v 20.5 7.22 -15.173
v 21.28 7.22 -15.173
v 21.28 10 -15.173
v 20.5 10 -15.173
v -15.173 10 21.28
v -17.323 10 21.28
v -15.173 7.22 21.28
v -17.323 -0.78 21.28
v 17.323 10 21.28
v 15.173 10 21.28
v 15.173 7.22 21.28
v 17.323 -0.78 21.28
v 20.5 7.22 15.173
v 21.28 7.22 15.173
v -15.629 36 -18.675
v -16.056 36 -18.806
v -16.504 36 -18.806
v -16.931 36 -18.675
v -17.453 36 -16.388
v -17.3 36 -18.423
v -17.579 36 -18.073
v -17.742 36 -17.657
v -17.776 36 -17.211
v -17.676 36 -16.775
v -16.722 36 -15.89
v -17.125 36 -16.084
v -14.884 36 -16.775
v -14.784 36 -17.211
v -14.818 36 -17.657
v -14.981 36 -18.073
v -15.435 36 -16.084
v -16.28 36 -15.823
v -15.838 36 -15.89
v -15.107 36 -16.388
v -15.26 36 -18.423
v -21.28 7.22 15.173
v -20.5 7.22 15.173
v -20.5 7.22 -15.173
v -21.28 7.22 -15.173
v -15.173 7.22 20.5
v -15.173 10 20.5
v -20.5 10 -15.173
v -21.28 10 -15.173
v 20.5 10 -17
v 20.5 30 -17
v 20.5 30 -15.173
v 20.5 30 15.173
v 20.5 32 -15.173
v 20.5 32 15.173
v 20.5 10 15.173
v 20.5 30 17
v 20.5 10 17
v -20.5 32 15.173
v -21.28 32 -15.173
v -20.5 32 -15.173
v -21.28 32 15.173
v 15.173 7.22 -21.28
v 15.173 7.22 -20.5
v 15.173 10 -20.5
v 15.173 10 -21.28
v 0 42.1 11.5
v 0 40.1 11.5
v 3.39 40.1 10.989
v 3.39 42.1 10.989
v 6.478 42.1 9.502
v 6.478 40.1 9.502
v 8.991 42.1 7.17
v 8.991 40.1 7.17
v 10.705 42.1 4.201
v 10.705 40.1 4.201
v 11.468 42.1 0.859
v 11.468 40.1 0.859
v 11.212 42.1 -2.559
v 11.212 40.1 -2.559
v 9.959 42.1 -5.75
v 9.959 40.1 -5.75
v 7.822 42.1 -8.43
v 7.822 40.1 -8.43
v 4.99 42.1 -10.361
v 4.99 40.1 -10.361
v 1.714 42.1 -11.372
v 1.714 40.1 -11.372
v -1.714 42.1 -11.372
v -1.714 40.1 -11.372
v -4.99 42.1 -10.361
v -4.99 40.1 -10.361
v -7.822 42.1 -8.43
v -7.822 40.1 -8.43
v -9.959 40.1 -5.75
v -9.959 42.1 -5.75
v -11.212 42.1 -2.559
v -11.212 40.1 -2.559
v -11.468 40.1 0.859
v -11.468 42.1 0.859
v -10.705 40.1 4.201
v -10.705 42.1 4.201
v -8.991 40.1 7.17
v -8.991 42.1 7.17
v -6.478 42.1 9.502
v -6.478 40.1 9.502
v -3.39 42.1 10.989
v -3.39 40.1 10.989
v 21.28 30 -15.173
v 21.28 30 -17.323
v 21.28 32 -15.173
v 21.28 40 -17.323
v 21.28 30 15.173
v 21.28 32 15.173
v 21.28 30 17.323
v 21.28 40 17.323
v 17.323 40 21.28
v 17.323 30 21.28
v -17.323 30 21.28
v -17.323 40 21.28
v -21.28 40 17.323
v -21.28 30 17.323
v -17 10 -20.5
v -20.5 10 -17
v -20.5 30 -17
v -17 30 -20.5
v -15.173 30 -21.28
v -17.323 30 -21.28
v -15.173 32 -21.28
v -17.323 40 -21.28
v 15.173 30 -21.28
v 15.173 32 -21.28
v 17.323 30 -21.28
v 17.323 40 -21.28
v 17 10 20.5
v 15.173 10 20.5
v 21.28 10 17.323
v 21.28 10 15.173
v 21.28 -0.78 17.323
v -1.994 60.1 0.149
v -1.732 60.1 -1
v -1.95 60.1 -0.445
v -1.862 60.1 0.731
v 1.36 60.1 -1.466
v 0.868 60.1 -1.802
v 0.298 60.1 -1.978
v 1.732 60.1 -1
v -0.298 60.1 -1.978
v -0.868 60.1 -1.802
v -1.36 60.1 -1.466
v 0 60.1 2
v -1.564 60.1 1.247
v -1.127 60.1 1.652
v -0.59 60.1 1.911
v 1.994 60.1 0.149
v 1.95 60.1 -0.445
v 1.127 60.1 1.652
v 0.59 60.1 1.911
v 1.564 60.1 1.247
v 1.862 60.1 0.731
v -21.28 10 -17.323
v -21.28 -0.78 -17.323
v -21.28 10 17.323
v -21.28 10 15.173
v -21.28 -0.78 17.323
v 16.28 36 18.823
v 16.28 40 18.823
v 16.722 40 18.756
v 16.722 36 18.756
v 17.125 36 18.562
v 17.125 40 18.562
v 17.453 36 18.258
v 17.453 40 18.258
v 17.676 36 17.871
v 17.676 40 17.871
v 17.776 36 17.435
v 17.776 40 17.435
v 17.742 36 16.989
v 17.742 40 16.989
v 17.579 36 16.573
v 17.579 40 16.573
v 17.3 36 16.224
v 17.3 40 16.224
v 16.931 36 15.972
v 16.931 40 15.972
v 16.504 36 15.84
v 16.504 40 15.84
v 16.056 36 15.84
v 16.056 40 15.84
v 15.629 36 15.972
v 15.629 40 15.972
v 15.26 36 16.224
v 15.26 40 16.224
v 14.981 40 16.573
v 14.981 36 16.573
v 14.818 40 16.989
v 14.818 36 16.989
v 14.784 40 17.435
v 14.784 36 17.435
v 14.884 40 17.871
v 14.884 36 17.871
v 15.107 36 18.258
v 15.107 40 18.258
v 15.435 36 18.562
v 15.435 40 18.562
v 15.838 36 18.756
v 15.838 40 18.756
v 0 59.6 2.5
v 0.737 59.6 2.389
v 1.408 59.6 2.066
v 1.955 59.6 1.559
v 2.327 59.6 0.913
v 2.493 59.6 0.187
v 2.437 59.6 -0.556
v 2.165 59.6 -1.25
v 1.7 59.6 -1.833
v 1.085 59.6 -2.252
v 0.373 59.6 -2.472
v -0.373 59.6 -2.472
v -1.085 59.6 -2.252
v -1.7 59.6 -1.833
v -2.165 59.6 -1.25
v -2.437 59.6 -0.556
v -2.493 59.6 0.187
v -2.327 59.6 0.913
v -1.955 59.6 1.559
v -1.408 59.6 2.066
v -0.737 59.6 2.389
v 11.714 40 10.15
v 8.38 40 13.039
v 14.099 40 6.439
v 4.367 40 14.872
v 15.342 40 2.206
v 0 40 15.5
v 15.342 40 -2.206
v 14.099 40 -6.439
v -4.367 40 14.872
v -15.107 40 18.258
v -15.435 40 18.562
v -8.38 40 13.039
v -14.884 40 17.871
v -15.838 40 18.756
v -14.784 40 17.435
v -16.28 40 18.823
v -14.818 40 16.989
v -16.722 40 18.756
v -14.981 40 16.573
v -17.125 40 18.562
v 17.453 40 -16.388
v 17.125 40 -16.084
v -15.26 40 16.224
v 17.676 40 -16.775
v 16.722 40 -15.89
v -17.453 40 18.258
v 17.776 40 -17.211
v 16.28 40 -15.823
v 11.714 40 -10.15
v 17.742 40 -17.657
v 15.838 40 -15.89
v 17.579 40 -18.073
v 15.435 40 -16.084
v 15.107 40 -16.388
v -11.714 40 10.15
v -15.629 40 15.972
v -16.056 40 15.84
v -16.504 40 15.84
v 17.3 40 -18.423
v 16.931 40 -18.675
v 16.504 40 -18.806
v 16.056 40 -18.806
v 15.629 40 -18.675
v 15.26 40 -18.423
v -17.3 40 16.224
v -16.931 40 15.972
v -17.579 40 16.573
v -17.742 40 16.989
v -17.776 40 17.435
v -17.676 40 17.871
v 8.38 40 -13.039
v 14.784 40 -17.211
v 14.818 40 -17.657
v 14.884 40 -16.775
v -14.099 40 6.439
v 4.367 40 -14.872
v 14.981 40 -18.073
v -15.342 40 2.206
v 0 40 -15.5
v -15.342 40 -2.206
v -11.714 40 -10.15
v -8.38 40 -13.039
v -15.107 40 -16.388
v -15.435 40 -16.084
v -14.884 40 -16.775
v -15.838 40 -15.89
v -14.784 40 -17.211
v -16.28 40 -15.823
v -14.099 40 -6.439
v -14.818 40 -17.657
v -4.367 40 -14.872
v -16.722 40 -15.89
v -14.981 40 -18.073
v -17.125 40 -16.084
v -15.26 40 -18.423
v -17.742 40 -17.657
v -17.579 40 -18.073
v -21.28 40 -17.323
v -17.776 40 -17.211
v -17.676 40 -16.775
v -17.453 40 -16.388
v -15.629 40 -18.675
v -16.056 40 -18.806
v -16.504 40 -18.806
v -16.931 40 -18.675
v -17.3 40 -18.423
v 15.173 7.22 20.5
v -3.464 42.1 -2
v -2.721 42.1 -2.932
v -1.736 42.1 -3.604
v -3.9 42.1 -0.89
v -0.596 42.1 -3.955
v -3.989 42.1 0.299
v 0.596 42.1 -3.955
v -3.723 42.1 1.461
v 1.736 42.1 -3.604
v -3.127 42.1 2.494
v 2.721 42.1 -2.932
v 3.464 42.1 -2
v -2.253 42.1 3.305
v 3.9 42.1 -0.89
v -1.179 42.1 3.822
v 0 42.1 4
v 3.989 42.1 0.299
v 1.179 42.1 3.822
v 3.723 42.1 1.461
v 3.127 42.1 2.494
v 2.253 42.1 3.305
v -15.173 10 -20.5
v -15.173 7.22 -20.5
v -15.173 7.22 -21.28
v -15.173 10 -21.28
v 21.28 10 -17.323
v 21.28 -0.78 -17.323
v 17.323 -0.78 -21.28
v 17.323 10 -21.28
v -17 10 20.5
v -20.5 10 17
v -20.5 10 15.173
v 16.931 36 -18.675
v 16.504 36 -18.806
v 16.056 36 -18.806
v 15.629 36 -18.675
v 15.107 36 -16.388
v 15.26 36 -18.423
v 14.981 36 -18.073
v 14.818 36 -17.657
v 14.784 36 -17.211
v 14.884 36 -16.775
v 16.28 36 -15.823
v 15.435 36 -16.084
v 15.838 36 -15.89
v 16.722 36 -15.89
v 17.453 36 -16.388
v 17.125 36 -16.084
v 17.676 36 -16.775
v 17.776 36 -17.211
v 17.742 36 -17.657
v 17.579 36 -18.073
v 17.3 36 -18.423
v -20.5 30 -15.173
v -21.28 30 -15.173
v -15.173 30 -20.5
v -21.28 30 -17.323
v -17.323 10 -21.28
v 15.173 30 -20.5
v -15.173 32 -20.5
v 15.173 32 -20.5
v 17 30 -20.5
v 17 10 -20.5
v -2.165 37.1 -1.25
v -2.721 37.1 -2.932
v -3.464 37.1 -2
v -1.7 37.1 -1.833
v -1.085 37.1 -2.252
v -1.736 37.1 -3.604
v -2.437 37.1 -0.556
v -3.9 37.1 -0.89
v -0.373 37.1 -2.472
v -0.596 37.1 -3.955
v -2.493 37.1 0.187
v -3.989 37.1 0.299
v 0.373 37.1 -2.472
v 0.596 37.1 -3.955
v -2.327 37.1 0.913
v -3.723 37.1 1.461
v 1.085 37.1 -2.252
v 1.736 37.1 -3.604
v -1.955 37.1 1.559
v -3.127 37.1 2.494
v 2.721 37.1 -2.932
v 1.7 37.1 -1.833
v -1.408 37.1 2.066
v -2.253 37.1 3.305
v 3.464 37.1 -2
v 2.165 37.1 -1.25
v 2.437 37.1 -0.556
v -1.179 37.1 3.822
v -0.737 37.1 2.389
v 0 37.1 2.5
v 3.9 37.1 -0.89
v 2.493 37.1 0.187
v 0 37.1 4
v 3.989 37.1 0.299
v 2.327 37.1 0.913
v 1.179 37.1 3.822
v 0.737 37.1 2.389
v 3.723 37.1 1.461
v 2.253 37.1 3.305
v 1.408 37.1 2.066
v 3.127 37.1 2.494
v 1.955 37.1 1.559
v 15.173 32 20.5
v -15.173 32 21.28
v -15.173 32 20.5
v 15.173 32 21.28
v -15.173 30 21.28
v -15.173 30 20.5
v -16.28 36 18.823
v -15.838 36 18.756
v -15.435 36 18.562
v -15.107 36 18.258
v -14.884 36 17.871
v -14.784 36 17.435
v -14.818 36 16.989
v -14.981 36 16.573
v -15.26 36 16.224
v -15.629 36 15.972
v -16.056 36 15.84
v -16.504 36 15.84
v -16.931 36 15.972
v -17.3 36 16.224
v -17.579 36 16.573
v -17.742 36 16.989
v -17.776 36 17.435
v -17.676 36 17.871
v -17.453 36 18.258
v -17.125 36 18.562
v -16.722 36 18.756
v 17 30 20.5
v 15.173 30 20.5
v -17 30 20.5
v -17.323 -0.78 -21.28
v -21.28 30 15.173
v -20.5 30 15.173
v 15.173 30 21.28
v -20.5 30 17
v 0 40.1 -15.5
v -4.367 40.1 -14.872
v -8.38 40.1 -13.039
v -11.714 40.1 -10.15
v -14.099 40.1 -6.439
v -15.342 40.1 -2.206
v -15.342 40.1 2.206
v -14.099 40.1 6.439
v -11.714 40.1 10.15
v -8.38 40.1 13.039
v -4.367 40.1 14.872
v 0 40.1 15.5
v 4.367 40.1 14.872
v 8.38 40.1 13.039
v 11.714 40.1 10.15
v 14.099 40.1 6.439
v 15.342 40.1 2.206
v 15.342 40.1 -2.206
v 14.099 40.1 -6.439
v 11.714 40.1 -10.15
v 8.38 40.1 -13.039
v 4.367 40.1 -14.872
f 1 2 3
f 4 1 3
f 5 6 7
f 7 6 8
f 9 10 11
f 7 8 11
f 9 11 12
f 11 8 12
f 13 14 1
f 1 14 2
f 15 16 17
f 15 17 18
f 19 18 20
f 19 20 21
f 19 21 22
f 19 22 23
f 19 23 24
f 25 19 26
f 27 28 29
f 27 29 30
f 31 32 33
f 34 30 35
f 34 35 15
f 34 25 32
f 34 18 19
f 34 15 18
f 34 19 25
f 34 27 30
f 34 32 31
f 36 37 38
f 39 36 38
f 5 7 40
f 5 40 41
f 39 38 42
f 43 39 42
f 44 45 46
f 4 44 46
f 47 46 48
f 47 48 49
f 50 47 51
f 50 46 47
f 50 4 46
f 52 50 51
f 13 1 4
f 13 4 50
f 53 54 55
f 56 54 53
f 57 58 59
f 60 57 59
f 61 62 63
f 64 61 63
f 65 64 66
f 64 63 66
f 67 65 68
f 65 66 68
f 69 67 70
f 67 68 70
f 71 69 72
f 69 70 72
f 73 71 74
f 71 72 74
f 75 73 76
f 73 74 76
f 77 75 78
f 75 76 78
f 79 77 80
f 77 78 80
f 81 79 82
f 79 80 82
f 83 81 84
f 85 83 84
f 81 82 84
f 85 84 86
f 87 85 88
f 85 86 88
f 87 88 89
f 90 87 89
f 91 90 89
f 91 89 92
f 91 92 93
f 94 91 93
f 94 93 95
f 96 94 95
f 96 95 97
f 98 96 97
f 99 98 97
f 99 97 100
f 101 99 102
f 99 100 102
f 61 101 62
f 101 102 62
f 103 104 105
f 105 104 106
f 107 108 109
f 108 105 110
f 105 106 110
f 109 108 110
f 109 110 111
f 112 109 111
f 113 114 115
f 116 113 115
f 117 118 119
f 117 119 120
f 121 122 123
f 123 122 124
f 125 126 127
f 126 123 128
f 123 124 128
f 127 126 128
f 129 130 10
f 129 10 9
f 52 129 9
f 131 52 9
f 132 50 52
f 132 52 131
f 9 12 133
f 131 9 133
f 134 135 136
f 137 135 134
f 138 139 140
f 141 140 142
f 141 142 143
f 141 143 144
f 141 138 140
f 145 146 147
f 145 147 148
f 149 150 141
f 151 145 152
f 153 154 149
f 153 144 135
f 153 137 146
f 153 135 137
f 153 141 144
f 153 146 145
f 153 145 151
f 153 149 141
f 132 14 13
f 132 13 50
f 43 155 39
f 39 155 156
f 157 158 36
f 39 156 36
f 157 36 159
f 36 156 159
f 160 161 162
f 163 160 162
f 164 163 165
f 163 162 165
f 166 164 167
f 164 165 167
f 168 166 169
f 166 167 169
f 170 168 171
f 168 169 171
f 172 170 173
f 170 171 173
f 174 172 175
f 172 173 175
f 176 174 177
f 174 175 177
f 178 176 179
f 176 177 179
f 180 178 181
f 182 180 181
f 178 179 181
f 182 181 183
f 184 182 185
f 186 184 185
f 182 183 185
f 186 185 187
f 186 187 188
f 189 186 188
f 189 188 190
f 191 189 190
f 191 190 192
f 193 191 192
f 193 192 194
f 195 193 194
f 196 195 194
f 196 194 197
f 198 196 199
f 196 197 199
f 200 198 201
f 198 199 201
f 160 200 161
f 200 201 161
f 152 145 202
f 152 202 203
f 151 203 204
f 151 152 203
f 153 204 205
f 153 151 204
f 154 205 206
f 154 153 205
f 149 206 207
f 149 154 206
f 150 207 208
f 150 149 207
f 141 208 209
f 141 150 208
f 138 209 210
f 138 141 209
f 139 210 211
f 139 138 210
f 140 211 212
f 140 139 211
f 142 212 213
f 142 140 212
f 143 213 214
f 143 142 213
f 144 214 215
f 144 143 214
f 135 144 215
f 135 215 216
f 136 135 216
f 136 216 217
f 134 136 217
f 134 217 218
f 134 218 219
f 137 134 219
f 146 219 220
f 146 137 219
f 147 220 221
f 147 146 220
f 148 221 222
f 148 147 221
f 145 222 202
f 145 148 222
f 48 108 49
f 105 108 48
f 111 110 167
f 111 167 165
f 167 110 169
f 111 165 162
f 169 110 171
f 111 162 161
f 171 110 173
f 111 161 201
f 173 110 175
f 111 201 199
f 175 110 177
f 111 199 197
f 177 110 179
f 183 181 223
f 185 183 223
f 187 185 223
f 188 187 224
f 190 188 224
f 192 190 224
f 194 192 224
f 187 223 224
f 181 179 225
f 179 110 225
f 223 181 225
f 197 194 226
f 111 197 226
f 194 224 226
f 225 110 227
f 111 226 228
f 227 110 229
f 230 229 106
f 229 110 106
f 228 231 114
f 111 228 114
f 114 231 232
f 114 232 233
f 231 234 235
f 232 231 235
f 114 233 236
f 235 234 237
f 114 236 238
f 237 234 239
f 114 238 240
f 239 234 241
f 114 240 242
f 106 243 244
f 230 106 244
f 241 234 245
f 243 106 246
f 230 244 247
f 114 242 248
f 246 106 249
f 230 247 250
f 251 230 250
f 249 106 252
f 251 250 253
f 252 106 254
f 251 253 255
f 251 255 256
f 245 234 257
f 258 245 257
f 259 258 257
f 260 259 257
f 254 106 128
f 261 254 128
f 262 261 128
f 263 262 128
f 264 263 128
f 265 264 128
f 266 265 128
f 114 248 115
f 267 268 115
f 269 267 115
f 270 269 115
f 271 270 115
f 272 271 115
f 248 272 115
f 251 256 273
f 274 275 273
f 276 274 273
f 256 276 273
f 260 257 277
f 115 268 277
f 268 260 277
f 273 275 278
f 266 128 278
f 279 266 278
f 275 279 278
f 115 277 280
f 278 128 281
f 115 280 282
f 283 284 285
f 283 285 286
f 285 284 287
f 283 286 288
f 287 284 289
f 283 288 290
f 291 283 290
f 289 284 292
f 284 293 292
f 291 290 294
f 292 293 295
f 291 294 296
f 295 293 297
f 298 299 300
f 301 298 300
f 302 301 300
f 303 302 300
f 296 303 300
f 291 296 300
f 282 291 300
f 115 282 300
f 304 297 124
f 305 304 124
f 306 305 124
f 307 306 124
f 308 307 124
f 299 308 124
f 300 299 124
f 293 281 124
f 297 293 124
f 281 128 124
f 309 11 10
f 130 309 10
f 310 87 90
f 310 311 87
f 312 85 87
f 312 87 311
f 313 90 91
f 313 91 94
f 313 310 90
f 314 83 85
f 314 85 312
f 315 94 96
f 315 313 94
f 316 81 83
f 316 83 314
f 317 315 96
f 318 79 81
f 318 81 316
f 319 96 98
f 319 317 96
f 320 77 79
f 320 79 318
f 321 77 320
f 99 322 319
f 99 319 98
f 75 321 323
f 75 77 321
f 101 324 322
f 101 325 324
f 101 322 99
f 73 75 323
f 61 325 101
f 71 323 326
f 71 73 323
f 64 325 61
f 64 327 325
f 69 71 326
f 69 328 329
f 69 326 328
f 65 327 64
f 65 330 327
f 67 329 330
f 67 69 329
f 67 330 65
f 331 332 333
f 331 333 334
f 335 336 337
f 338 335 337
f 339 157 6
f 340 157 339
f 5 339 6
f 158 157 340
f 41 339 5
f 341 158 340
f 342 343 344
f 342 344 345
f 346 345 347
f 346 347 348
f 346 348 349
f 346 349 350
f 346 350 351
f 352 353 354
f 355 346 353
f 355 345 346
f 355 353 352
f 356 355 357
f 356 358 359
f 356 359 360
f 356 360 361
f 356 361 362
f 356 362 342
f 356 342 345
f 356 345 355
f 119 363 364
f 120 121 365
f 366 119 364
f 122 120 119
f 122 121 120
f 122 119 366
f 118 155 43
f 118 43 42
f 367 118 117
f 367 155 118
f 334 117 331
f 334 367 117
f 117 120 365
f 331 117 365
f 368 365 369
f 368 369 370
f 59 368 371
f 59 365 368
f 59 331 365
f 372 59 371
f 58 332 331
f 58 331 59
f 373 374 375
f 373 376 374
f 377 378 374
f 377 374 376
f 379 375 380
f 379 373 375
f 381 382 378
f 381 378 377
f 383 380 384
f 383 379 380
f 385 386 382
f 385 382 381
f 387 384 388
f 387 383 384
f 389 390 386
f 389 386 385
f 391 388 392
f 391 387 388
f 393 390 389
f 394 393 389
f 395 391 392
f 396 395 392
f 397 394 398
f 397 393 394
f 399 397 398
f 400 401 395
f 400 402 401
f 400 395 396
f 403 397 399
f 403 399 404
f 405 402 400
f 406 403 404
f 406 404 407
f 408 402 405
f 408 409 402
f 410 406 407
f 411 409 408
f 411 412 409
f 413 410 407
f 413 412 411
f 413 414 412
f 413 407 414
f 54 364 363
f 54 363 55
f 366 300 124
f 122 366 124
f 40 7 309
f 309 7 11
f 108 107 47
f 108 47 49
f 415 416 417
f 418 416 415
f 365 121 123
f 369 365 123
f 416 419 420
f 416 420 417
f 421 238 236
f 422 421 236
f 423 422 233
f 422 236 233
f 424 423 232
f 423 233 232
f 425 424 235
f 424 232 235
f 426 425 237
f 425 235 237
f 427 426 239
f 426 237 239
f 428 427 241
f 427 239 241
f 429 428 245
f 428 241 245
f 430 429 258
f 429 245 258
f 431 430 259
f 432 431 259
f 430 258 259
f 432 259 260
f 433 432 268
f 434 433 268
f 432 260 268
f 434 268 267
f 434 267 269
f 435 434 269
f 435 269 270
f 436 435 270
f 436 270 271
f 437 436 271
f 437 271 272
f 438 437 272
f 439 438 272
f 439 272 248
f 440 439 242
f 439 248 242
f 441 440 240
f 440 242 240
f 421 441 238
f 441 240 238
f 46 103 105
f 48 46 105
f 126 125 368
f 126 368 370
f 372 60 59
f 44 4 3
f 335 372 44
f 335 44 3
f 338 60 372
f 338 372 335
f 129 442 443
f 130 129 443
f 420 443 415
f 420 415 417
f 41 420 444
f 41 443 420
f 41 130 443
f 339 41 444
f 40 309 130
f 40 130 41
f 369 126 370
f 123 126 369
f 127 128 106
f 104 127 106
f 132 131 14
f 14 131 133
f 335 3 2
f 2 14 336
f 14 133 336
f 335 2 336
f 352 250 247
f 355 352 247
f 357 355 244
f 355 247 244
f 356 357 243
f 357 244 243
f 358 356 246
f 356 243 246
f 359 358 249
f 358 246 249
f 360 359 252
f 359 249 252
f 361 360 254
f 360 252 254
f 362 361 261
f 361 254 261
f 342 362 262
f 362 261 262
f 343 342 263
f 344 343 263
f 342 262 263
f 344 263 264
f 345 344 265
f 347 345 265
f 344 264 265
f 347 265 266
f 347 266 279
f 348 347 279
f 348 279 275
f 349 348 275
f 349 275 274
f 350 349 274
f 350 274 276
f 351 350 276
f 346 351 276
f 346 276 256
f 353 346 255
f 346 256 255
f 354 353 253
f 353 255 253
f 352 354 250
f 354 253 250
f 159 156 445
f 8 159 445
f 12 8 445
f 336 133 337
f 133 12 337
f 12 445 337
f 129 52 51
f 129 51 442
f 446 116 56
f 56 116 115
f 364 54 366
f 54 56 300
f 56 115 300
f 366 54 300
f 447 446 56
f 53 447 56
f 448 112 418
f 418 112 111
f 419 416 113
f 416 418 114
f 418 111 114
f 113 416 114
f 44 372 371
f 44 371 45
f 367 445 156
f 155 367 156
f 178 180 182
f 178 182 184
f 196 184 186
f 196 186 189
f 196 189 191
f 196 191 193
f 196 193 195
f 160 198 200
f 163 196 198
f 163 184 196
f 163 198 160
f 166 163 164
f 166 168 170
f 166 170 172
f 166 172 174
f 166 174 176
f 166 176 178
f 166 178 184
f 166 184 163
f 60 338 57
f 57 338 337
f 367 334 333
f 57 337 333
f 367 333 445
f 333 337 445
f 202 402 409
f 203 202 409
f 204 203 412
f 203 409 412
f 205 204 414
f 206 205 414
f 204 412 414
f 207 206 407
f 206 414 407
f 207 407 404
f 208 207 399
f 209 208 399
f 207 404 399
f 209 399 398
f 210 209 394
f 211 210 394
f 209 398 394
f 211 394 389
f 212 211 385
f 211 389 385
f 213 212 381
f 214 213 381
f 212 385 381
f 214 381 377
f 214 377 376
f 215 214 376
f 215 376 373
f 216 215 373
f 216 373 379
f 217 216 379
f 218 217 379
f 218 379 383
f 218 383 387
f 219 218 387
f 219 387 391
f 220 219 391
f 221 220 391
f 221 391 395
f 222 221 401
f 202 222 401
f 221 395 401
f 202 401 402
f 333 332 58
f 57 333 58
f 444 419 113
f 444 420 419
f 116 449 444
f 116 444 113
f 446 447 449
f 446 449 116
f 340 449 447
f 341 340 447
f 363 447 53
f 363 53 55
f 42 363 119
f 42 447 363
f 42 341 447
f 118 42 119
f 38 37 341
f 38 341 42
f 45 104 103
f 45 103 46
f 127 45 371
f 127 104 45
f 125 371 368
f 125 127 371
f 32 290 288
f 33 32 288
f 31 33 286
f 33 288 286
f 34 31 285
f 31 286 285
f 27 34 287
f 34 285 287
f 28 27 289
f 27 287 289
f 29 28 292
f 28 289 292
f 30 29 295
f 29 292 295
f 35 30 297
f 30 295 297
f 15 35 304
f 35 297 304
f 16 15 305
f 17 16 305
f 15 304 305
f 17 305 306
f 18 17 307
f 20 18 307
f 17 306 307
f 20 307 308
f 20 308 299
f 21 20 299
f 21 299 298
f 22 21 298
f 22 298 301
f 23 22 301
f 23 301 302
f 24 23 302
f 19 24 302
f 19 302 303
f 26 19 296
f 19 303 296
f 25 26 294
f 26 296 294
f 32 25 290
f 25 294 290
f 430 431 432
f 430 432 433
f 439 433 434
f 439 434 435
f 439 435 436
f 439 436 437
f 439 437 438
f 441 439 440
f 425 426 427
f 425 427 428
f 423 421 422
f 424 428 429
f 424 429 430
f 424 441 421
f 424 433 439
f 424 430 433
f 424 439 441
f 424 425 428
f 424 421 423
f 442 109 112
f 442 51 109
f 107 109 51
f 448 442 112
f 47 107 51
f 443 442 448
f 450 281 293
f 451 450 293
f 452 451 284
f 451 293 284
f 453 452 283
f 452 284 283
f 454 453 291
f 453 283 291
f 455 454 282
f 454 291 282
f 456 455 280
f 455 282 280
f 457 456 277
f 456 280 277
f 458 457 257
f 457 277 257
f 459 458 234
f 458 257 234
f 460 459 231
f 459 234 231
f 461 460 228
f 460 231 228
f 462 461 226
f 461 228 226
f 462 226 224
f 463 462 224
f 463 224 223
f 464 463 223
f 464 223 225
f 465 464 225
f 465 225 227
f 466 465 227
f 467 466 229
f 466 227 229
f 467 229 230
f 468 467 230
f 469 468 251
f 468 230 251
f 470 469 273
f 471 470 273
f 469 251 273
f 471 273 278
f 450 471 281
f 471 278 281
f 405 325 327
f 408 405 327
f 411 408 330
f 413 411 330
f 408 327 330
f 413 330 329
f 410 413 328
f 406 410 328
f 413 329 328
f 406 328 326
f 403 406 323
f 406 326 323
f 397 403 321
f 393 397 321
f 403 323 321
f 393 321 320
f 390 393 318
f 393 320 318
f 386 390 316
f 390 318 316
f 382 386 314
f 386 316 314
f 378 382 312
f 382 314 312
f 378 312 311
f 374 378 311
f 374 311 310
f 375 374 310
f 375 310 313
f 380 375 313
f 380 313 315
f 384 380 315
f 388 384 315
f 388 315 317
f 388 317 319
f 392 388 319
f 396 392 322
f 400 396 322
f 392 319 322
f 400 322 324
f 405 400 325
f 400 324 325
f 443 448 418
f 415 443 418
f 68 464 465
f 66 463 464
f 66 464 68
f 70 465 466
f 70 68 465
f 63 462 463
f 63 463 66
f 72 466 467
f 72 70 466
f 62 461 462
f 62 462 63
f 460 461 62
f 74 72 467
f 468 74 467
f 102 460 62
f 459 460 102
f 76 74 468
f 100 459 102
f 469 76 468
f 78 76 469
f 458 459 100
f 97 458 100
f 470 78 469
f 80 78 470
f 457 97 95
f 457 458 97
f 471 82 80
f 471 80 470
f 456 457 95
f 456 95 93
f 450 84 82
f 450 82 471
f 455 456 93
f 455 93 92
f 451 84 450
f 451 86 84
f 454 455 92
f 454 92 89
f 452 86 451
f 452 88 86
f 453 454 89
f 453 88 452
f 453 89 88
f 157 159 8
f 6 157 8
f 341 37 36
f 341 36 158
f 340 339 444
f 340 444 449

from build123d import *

# Parameters (mm, degrees)
SALIENTE_EXTRUIR2_DEPTH = 10
VACIADO6_T              = 0.78
CROQUIS2_W              = 30.346173158
CROQUIS2_H              = 2.78
CORTAR_EXTRUIR1_DEPTH   = 49.622957541
CROQUIS3_W              = 30.346173158
CROQUIS3_H              = 2.78
CORTAR_EXTRUIR2_DEPTH   = 49.622957541
SALIENTE_EXTRUIR3_DEPTH = 40
SALIENTE_EXTRUIR4_DEPTH = 10
CROQUIS6_W              = 30.346173158
CROQUIS6_H              = 2
CORTAR_EXTRUIR3_DEPTH   = 0.78
CROQUIS7_W              = 30.346173158
CROQUIS7_H              = 2
CORTAR_EXTRUIR4_DEPTH   = 0.78
CROQUIS8_W              = 30.346173158
CROQUIS8_H              = 2
CORTAR_EXTRUIR5_DEPTH   = 0.78
CROQUIS9_W              = 30.346173158
CROQUIS9_H              = 2
CORTAR_EXTRUIR6_DEPTH   = 0.78
CROQUIS10_R             = 1.5
CORTAR_EXTRUIR7_DEPTH   = 4
CROQUIS11_R             = 15.5
SALIENTE_EXTRUIR5_DEPTH = 0.1
CROQUIS12_R             = 11.5
SALIENTE_EXTRUIR6_DEPTH = 2
CROQUIS13_R             = 4
CORTAR_EXTRUIR8_DEPTH   = 5
CROQUIS14_R             = 2.5
SALIENTE_EXTRUIR7_DEPTH = 23
CHAFL_N1_SIZE           = 0.5


with BuildPart() as part:
    # Croquis1 → Saliente-Extruir2 (new body)
    with BuildSketch(Plane(origin=(0, 0, 0), x_dir=(1, 0, 0), z_dir=(0, 1, 0))):
        Polygon((20.5, 17), (17, 20.5), (-17, 20.5), (-20.5, 17), (-20.5, -17), (-17, -20.5), (17, -20.5), (20.5, -17), align=None)
    extrude(amount=SALIENTE_EXTRUIR2_DEPTH)

    # Vaciado6
    vaciado6_openings = [part.faces().sort_by_distance(p)[0] for p in [
        (0, 10, 0),
    ]]
    offset(amount=VACIADO6_T, openings=vaciado6_openings, kind=Kind.INTERSECTION)

    # Croquis2 → Cortar-Extruir1 (cut, through all)
    with BuildSketch(Plane(origin=(21.28, 0, 0), x_dir=(0, 0, -1), z_dir=(1, 0, 0))):
        with Locations((0, 8.61)):
            Rectangle(CROQUIS2_W, CROQUIS2_H)
    extrude(amount=-CORTAR_EXTRUIR1_DEPTH, mode=Mode.SUBTRACT)

    # Croquis3 → Cortar-Extruir2 (cut, through all)
    with BuildSketch(Plane.XY.offset(21.28)):
        with Locations((0, 8.61)):
            Rectangle(CROQUIS3_W, CROQUIS3_H)
    extrude(amount=-CORTAR_EXTRUIR2_DEPTH, mode=Mode.SUBTRACT)

    # Croquis4 → Saliente-Extruir3 (add)
    with BuildSketch(Plane(origin=(0, 0, 0), x_dir=(1, 0, 0), z_dir=(0, 1, 0))):
        Polygon((-17, 20.5), (17, 20.5), (20.5, 17), (20.5, -17), (17, -20.5), (-17, -20.5), (-20.5, -17), (-20.5, 17), align=None)
    extrude(amount=SALIENTE_EXTRUIR3_DEPTH)

    # Croquis5 → Saliente-Extruir4 (add)
    with BuildSketch(Plane(origin=(0, 40, 0), x_dir=(1, 0, 0), z_dir=(0, 1, 0))):
        Polygon((-21.28, 17.323086579), (-17.323086579, 21.28), (17.323086579, 21.28), (21.28, 17.323086579), (21.28, -17.323086579), (17.323086579, -21.28), (-17.323086579, -21.28), (-21.28, -17.323086579), align=None)
    extrude(amount=-SALIENTE_EXTRUIR4_DEPTH)

    # Croquis6 → Cortar-Extruir3 (cut)
    with BuildSketch(Plane.XY.offset(21.28)):
        with Locations((0, 31)):
            Rectangle(CROQUIS6_W, CROQUIS6_H)
    extrude(amount=-CORTAR_EXTRUIR3_DEPTH, mode=Mode.SUBTRACT)

    # Croquis7 → Cortar-Extruir4 (cut)
    with BuildSketch(Plane(origin=(0, 0, -21.28), x_dir=(-1, 0, 0), z_dir=(0, 0, -1))):
        with Locations((0, 31)):
            Rectangle(CROQUIS7_W, CROQUIS7_H)
    extrude(amount=-CORTAR_EXTRUIR4_DEPTH, mode=Mode.SUBTRACT)

    # Croquis8 → Cortar-Extruir5 (cut)
    with BuildSketch(Plane.ZY.offset(21.28)):
        with Locations((0, 31)):
            Rectangle(CROQUIS8_W, CROQUIS8_H)
    extrude(amount=-CORTAR_EXTRUIR5_DEPTH, mode=Mode.SUBTRACT)

    # Croquis9 → Cortar-Extruir6 (cut)
    with BuildSketch(Plane(origin=(21.28, 0, 0), x_dir=(0, 0, -1), z_dir=(1, 0, 0))):
        with Locations((0, 31)):
            Rectangle(CROQUIS9_W, CROQUIS9_H)
    extrude(amount=-CORTAR_EXTRUIR6_DEPTH, mode=Mode.SUBTRACT)

    # Croquis10 → Cortar-Extruir7 (cut)
    with BuildSketch(Plane(origin=(0, 40, 0), x_dir=(1, 0, 0), z_dir=(0, 1, 0))):
        with Locations(Location((-16.28, 17.323086579, 0), (0, 0, 270))):
            Circle(CROQUIS10_R)
        with Locations(Location((16.28, 17.323086579, 0), (0, 0, 270))):
            Circle(CROQUIS10_R)
        with Locations(Location((16.28, -17.323086579, 0), (0, 0, 270))):
            Circle(CROQUIS10_R)
        with Locations(Location((-16.28, -17.323086579, 0), (0, 0, 270))):
            Circle(CROQUIS10_R)
    extrude(amount=-CORTAR_EXTRUIR7_DEPTH, mode=Mode.SUBTRACT)

    # Croquis11 → Saliente-Extruir5 (add)
    with BuildSketch(Plane(origin=(0, 40, 0), x_dir=(1, 0, 0), z_dir=(0, 1, 0))):
        with Locations(Location((0, 0, 0), (0, 0, 90))):
            Circle(CROQUIS11_R)
    extrude(amount=SALIENTE_EXTRUIR5_DEPTH)

    # Croquis12 → Saliente-Extruir6 (add)
    with BuildSketch(Plane(origin=(0, 40.1, 0), x_dir=(1, 0, 0), z_dir=(0, 1, 0))):
        with Locations(Location((0, 0, 0), (0, 0, 270))):
            Circle(CROQUIS12_R)
    extrude(amount=SALIENTE_EXTRUIR6_DEPTH)

    # Croquis13 → Cortar-Extruir8 (cut)
    with BuildSketch(Plane(origin=(0, 42.1, 0), x_dir=(1, 0, 0), z_dir=(0, 1, 0))):
        with Locations(Location((0, 0, 0), (0, 0, 270))):
            Circle(CROQUIS13_R)
    extrude(amount=-CORTAR_EXTRUIR8_DEPTH, mode=Mode.SUBTRACT)

    # Croquis14 → Saliente-Extruir7 (add)
    with BuildSketch(Plane(origin=(0, 37.1, 0), x_dir=(1, 0, 0), z_dir=(0, 1, 0))):
        with Locations(Location((0, 0, 0), (0, 0, 270))):
            Circle(CROQUIS14_R)
    extrude(amount=SALIENTE_EXTRUIR7_DEPTH)

    # Chaflán1
    chafl_n1_edges = [part.edges().sort_by_distance(p)[0] for p in [
        (0, 60.1, -2.5),
    ]]
    chamfer(chafl_n1_edges, length=CHAFL_N1_SIZE)


solid = part.part
